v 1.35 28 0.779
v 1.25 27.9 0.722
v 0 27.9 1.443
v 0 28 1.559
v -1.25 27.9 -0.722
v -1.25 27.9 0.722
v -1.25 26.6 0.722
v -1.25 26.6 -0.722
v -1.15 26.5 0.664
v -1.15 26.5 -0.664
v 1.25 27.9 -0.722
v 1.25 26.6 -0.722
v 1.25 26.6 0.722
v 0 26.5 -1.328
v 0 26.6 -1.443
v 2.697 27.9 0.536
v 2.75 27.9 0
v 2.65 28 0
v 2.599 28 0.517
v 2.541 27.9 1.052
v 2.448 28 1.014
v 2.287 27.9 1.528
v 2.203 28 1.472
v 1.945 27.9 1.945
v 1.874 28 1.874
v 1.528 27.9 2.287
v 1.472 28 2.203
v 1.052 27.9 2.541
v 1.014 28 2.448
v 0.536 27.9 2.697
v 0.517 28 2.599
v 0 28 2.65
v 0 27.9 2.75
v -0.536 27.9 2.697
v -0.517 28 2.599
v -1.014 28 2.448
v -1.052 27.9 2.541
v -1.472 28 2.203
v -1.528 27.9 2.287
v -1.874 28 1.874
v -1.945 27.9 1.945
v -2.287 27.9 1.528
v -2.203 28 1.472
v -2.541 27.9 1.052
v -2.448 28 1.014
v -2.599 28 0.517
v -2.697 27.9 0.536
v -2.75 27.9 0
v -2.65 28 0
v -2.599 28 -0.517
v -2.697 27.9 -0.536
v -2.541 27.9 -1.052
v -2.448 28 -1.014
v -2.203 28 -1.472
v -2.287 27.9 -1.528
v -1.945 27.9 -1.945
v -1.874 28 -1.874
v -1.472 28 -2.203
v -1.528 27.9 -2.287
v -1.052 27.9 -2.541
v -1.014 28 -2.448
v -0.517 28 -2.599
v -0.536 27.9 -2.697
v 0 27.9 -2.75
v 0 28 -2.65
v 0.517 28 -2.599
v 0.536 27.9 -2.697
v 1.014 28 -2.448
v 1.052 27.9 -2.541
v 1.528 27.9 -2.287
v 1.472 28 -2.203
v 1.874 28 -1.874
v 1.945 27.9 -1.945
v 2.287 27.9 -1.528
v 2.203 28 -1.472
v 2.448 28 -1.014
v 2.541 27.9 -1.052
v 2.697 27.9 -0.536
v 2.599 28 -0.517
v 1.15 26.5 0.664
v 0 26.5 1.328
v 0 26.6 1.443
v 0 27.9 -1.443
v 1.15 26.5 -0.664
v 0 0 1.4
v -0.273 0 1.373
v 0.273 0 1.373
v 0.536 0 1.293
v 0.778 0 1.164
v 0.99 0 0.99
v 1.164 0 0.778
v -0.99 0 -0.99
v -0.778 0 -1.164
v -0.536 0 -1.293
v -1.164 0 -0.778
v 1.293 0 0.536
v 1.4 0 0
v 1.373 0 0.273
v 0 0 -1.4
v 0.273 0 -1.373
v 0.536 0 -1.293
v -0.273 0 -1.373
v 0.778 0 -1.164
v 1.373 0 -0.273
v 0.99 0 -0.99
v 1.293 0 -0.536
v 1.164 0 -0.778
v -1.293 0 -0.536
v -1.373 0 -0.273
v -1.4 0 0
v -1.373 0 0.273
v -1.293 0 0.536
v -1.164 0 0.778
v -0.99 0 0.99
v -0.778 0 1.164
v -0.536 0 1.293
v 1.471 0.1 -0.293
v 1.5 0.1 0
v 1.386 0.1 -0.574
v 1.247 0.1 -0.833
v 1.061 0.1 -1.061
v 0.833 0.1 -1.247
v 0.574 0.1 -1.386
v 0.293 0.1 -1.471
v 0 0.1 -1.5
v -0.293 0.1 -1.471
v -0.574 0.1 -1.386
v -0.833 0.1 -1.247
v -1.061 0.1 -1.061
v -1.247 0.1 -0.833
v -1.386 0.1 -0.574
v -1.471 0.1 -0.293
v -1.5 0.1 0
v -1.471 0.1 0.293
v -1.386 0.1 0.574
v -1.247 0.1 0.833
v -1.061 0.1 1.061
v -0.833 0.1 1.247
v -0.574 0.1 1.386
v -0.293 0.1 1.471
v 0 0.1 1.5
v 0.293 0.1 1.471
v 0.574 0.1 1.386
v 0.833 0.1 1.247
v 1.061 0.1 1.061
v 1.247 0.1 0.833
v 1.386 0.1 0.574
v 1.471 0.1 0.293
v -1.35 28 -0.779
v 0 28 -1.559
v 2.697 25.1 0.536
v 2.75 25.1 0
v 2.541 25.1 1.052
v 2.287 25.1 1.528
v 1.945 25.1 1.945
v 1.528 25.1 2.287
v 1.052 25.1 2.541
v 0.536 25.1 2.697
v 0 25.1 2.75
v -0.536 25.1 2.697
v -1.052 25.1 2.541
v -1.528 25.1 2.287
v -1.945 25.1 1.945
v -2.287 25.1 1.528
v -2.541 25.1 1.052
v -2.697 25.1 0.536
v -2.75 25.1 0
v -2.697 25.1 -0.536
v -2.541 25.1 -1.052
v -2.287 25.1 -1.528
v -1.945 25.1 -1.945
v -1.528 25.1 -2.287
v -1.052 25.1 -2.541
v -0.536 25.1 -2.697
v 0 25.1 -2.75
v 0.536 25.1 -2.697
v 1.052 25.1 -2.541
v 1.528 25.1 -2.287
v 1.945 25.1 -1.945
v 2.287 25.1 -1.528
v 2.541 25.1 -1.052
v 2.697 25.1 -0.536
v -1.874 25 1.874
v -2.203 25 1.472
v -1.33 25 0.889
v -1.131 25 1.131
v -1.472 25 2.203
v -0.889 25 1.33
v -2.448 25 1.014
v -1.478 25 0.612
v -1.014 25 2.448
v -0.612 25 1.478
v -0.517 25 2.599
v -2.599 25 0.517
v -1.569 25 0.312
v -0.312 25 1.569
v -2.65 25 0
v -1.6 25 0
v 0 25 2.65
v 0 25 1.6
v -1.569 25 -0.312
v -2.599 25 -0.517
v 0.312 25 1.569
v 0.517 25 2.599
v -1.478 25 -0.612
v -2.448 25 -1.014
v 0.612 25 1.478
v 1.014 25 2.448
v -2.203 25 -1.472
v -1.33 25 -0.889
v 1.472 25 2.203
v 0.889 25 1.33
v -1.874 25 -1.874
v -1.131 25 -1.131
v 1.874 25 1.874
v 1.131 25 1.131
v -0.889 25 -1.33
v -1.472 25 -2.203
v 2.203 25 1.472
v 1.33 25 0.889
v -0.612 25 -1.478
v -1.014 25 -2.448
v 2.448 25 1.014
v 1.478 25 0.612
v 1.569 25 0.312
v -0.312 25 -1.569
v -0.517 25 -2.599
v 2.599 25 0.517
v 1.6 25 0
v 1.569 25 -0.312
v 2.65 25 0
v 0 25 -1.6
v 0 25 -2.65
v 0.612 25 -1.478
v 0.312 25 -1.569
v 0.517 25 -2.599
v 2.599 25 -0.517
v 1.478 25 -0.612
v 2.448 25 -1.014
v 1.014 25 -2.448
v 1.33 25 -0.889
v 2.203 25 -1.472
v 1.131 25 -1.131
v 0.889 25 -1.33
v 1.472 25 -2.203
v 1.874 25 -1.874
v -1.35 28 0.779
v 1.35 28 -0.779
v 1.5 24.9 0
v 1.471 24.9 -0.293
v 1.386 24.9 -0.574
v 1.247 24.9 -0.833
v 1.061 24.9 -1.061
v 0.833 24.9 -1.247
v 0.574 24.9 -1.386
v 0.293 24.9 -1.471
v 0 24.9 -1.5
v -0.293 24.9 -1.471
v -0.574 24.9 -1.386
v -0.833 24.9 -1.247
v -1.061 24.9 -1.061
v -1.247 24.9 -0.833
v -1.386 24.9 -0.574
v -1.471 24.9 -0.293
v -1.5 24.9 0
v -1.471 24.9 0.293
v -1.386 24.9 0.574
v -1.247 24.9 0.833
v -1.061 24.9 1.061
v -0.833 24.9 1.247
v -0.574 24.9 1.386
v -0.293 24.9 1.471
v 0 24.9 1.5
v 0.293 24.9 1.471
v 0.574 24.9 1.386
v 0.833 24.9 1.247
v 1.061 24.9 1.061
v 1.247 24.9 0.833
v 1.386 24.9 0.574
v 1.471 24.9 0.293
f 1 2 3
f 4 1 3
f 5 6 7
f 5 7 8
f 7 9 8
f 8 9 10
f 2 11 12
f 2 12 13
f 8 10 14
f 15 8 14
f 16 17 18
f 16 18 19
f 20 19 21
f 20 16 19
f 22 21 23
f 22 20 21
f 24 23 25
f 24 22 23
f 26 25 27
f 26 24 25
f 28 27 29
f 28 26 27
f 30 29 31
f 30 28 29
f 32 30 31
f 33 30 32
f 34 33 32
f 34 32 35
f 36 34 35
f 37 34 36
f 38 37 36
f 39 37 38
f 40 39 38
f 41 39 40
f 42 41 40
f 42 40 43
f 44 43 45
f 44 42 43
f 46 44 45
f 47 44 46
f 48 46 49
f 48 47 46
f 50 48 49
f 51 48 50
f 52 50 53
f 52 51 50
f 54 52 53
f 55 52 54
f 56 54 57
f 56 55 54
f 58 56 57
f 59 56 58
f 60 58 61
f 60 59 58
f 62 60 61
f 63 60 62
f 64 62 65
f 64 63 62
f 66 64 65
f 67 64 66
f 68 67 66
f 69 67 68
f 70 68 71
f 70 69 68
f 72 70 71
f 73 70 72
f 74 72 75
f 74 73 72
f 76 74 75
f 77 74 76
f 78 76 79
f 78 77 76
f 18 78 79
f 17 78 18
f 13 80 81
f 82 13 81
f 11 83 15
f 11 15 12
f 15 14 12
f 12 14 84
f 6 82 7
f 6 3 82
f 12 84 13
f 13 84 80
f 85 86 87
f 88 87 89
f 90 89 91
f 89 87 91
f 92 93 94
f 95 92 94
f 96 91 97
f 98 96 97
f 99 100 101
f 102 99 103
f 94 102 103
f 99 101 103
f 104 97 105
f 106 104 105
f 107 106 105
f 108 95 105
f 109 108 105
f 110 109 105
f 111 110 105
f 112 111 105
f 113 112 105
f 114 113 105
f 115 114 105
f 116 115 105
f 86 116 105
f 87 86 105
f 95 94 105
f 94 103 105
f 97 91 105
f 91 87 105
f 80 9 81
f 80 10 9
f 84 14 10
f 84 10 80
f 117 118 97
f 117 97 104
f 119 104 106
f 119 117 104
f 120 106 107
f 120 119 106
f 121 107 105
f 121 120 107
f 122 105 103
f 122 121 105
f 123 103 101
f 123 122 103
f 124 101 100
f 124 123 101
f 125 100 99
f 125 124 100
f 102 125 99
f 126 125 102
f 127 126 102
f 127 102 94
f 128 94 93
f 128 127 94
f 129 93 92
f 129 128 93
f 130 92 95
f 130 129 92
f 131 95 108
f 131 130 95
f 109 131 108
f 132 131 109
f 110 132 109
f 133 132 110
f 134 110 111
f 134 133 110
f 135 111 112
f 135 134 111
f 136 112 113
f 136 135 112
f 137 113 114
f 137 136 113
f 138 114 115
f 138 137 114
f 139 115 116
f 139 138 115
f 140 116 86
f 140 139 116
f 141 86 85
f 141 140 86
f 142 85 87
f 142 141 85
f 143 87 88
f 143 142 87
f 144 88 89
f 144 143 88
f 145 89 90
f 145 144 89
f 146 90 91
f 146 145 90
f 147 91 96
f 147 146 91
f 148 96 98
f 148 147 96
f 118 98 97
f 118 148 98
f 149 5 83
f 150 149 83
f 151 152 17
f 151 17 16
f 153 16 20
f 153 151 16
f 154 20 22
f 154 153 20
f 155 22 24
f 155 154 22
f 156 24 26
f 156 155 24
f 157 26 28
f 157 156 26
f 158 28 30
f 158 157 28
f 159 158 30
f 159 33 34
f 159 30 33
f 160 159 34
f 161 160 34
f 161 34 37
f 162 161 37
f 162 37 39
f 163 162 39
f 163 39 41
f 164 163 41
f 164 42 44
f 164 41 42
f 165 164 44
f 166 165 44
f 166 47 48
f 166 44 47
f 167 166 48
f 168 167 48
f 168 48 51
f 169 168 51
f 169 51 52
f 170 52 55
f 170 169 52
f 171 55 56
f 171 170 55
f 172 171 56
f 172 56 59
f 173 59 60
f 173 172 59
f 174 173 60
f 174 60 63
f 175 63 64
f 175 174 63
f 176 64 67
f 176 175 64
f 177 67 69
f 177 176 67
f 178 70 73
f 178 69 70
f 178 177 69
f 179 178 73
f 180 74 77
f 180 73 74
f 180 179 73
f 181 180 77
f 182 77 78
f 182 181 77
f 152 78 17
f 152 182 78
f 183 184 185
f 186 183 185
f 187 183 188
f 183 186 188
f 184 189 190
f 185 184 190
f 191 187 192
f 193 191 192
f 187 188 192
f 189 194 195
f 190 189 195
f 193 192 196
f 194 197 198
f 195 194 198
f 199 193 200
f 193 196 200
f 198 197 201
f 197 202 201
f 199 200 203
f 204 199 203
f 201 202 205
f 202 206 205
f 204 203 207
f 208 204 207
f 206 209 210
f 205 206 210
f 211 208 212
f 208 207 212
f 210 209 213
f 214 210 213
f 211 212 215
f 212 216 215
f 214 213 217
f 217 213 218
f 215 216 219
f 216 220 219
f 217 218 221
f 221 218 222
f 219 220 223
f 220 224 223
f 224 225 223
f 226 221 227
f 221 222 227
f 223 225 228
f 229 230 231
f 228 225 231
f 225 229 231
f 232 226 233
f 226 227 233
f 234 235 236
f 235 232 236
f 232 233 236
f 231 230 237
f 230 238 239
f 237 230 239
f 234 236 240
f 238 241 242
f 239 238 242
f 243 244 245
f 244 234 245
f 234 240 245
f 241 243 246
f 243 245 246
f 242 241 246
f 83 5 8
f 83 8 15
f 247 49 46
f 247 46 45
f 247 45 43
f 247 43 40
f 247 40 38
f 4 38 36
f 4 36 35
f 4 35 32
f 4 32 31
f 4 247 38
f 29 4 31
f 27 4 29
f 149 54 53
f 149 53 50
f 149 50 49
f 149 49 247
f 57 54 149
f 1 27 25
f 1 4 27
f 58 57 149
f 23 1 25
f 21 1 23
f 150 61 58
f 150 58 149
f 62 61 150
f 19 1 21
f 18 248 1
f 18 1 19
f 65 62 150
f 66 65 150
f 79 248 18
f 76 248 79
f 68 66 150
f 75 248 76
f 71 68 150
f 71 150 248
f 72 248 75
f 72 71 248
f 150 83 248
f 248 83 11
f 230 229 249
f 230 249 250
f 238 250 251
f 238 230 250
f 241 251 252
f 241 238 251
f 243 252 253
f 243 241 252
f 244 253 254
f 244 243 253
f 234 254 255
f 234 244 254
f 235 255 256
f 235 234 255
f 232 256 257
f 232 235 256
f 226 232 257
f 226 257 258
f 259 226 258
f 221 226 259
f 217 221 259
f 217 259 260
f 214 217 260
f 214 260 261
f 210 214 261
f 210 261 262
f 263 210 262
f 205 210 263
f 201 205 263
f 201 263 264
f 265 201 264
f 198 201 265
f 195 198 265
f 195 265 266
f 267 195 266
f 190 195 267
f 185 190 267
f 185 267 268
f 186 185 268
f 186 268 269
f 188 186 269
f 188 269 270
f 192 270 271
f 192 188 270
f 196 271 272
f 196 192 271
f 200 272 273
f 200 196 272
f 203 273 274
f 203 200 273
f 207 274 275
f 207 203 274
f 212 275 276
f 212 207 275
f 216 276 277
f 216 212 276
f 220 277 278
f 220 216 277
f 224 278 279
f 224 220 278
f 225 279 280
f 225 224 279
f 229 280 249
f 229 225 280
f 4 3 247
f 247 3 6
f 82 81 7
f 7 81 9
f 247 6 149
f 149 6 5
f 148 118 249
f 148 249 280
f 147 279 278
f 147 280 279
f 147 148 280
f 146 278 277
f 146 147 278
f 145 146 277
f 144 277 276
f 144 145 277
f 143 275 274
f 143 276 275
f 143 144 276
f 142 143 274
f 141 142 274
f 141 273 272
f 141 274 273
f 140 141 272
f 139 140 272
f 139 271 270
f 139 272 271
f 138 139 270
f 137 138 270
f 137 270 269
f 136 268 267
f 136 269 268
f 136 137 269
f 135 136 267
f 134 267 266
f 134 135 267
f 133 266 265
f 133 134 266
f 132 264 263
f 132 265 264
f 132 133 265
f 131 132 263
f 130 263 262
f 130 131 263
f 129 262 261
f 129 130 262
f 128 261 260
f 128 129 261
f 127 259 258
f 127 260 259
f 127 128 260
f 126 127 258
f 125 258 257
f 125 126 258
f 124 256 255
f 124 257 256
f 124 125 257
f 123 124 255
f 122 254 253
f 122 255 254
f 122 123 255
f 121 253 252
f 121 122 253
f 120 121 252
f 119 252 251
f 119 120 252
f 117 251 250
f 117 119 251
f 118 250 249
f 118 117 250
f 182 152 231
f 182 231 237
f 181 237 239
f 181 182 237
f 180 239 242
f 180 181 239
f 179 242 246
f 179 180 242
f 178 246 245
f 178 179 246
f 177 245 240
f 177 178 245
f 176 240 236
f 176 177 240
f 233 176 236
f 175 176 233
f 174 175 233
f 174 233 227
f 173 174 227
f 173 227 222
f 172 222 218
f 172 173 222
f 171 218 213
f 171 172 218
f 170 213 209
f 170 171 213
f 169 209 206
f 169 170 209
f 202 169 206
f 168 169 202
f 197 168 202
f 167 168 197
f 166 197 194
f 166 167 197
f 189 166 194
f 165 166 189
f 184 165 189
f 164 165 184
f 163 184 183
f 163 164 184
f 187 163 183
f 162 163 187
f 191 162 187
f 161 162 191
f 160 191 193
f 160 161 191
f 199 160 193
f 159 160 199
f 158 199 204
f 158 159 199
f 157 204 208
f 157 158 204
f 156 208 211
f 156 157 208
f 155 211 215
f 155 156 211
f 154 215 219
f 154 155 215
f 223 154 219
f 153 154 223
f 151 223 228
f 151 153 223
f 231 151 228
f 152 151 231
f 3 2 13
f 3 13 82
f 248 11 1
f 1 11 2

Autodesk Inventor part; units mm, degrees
ref_plane "YZ Plane" through (0, 0, 0) normal (1, 0, 0) x (0, 1, 0)
ref_plane "XZ Plane" through (0, 0, 0) normal (0, 1, 0) x (-1, 0, 0)
ref_plane "XY Plane" through (0, 0, 0) normal (0, 0, 1) x (1, 0, 0)
sketch "Sketch1" plane through (0, 0, 0) normal (0, 0, 1) x (1, 0, 0)
  line L0 (0, 28) -> (2.75, 28)
  line L1 (2.75, 28) -> (2.75, 25)
  line L2 (2.75, 25) -> (1.5, 25)
  line L3 (1.5, 25) -> (1.5, 0)
  line L4 (1.5, 0) -> (0, 0)
  line L5 (0, 0) -> (0, 28)
  dimension "d0" = 2.75
  dimension "d1" = 3
  dimension "d2" = 25
  dimension "d3" = 1.5
revolve "Revolution1" add sketch "Sketch1" angle 360 about axis through (0, 0, 0) along (0, 1, 0)
thread "Thread1" size "M3x0.5" class "6g" standard "ANSI Metric M Profile" full length
sketch "Sketch3" plane through (0, 28, 0) normal (0, 1, 0) x (1, 0, 0)
  line L0 (1.25, -0.7217) -> (0, -1.4434)
  line L1 (0, -1.4434) -> (-1.25, -0.7217)
  line L2 (-1.25, -0.7217) -> (-1.25, 0.7217)
  line L3 (-1.25, 0.7217) -> (0, 1.4434)
  line L4 (0, 1.4434) -> (1.25, 0.7217)
  line L5 (1.25, 0.7217) -> (1.25, -0.7217)
  point P0 (0, 0)
  point P1 (0, 0)
  dimension "d13" = 2.5
extrude "Extrusion2" cut sketch "Sketch3" against normal blind 1.5
chamfer "Chamfer2" distance 0.1 angle 45 16 edges at (0.625, 28, 1.0825) (1.25, 28, 0) (1.25, 26.5, 0) (0.625, 28, -1.0825) (0.625, 26.5, -1.0825) (-0.625, 28, -1.0825) (-0.625, 26.5, -1.0825) (-1.25, 26.5, 0) (-1.25, 28, 0) (-0.625, 26.5, 1.0825) (-0.625, 28, 1.0825) (0.625, 26.5, 1.0825) (-2.75, 28, 0) (-2.75, 25, 0) (-1.5, 25, 0) (-1.5, 0, 0)
properties part number "M3 X 25"
